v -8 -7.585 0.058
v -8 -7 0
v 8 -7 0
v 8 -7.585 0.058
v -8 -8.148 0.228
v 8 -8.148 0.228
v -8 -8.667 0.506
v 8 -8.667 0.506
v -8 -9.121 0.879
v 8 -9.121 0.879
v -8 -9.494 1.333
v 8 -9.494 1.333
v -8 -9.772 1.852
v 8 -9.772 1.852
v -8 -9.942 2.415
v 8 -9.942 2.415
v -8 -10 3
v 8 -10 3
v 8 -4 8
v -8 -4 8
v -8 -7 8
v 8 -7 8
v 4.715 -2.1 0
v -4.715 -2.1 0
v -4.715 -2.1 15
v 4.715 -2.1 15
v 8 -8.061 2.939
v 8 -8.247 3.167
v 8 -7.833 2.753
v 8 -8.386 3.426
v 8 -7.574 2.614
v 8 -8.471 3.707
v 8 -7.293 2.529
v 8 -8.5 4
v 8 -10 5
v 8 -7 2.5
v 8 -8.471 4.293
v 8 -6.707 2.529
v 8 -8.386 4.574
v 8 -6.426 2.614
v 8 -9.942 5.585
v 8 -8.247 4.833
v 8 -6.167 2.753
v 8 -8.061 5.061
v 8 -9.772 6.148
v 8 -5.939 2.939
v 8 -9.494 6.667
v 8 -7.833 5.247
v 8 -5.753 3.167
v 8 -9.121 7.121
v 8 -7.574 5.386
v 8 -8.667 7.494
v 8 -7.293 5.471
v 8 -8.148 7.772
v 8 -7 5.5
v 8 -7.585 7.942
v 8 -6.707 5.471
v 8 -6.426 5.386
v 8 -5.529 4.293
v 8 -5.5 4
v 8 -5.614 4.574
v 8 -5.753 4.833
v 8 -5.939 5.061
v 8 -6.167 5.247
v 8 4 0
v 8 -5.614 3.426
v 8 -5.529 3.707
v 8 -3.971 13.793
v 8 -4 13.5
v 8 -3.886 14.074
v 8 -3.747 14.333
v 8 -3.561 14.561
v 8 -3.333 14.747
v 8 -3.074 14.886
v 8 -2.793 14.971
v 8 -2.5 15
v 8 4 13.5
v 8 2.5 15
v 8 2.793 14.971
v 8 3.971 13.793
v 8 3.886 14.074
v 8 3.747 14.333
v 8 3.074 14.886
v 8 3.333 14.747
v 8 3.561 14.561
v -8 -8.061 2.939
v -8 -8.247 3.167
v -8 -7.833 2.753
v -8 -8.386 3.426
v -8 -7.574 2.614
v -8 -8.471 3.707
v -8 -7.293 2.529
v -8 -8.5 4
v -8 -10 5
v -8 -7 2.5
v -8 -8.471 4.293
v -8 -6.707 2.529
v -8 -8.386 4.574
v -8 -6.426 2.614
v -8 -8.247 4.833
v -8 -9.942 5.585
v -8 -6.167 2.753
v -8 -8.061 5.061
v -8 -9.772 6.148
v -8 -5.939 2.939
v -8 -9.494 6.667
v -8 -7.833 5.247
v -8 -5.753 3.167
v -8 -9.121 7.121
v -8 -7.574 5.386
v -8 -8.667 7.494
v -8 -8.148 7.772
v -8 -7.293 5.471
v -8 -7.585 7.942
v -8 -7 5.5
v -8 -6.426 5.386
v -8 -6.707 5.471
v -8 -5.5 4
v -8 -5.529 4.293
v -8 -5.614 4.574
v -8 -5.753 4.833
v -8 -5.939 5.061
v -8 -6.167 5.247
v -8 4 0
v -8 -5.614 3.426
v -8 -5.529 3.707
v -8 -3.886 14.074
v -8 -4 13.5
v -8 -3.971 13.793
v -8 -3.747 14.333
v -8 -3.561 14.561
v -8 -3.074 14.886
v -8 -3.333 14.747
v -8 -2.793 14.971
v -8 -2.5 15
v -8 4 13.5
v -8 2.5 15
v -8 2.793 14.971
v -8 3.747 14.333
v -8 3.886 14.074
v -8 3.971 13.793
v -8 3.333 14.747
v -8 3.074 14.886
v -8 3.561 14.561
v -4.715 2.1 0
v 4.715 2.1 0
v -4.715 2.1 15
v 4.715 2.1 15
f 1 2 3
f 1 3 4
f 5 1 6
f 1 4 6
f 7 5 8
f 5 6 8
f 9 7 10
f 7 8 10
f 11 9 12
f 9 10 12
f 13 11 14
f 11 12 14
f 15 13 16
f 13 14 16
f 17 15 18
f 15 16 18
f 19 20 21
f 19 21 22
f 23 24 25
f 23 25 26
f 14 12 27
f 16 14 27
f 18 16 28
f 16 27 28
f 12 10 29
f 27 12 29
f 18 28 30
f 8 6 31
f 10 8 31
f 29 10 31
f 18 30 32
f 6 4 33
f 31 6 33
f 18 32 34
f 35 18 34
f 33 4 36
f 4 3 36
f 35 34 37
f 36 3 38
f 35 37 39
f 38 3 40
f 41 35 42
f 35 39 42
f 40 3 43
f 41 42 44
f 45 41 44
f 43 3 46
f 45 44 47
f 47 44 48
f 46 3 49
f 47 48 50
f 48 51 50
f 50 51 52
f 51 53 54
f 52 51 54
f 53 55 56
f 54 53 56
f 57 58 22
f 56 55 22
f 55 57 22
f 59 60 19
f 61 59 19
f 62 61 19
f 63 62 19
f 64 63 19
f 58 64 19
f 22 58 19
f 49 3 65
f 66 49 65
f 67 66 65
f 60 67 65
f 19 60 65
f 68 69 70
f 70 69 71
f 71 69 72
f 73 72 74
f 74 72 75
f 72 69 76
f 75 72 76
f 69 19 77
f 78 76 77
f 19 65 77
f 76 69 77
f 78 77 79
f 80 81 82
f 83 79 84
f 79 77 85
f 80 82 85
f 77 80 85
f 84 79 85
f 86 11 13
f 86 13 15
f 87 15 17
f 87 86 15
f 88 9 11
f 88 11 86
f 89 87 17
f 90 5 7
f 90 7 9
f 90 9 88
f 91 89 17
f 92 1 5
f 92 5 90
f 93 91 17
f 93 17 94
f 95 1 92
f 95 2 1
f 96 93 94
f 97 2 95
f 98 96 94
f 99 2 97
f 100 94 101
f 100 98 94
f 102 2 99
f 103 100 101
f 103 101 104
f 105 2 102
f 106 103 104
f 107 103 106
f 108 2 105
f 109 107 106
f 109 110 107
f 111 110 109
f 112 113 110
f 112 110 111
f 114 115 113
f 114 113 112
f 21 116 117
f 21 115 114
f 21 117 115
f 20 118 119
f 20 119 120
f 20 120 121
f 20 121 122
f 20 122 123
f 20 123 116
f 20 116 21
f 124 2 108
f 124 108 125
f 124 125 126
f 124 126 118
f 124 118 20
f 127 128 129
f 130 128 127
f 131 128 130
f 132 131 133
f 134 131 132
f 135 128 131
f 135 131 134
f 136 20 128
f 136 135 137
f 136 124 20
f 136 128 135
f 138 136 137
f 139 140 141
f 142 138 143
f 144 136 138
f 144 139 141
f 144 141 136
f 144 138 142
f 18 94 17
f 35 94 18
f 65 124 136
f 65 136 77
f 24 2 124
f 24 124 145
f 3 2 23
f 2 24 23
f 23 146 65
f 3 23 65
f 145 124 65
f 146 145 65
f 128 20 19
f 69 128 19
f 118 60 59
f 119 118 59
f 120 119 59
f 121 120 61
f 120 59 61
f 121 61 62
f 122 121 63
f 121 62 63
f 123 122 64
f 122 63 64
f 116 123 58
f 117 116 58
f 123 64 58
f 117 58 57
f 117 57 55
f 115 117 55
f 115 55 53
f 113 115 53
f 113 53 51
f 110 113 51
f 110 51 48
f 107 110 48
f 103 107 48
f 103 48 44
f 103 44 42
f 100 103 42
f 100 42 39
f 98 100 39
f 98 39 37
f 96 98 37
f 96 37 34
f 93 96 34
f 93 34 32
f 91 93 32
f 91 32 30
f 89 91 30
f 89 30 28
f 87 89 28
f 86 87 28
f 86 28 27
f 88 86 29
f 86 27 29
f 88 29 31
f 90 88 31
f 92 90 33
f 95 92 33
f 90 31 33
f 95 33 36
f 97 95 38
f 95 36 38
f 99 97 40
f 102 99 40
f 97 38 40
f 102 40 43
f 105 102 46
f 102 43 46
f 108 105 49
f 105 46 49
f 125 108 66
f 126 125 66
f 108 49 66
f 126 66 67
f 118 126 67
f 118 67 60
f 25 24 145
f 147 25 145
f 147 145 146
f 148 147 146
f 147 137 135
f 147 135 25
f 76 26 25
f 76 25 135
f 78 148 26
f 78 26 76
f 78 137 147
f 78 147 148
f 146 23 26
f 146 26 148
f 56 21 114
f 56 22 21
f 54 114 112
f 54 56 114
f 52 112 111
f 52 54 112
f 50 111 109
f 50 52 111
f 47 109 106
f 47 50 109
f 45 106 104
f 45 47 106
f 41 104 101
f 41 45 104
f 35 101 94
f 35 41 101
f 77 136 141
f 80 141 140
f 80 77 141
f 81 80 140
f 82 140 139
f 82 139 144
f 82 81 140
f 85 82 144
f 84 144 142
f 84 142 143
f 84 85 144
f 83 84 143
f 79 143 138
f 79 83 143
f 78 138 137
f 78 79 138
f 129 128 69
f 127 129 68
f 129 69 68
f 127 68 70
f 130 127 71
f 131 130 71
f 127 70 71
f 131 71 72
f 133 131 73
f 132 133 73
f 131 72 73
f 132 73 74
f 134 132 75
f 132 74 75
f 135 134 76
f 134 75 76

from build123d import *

# Parameters (mm, degrees)
F0_W     = 16
F0_H     = 8
F0_W_2   = 9.43
F0_H_2   = 4.2
F1_DEPTH = 15
F2_W     = 16
F2_H     = 8
F3_DEPTH = 6
F4_R     = 3
F6_D     = 3
F7_R     = 1.5


with BuildPart() as f1:
    # F0 (on Top) → F1 (new body)
    with BuildSketch(Plane.XY):
        Rectangle(F0_W, F0_H)
        Rectangle(F0_W_2, F0_H_2, mode=Mode.SUBTRACT)
    extrude(amount=F1_DEPTH)

    # F2 (on face) → F3 (join)
    with BuildSketch(Plane.XZ.offset(4)):
        with Locations((0, 4)):
            Rectangle(F2_W, F2_H)
    extrude(amount=F3_DEPTH)

    # F4
    f4_edges = [f1.edges().sort_by_distance(p)[0] for p in [
        (0, -10, 0),
        (0, -10, 8),
    ]]
    fillet(f4_edges, radius=F4_R)

    # F6 (through all)
    with Locations(Plane(origin=(-8, 0, 0), x_dir=(0, -1, 0), z_dir=(-1, 0, 0))):
        with Locations((7, 4)):
            Hole(F6_D / 2)

    # F7
    f7_edges = [f1.edges().sort_by_distance(p)[0] for p in [
        (0, -4, 15),
        (0, 4, 15),
    ]]
    fillet(f7_edges, radius=F7_R)


solid = f1.part
